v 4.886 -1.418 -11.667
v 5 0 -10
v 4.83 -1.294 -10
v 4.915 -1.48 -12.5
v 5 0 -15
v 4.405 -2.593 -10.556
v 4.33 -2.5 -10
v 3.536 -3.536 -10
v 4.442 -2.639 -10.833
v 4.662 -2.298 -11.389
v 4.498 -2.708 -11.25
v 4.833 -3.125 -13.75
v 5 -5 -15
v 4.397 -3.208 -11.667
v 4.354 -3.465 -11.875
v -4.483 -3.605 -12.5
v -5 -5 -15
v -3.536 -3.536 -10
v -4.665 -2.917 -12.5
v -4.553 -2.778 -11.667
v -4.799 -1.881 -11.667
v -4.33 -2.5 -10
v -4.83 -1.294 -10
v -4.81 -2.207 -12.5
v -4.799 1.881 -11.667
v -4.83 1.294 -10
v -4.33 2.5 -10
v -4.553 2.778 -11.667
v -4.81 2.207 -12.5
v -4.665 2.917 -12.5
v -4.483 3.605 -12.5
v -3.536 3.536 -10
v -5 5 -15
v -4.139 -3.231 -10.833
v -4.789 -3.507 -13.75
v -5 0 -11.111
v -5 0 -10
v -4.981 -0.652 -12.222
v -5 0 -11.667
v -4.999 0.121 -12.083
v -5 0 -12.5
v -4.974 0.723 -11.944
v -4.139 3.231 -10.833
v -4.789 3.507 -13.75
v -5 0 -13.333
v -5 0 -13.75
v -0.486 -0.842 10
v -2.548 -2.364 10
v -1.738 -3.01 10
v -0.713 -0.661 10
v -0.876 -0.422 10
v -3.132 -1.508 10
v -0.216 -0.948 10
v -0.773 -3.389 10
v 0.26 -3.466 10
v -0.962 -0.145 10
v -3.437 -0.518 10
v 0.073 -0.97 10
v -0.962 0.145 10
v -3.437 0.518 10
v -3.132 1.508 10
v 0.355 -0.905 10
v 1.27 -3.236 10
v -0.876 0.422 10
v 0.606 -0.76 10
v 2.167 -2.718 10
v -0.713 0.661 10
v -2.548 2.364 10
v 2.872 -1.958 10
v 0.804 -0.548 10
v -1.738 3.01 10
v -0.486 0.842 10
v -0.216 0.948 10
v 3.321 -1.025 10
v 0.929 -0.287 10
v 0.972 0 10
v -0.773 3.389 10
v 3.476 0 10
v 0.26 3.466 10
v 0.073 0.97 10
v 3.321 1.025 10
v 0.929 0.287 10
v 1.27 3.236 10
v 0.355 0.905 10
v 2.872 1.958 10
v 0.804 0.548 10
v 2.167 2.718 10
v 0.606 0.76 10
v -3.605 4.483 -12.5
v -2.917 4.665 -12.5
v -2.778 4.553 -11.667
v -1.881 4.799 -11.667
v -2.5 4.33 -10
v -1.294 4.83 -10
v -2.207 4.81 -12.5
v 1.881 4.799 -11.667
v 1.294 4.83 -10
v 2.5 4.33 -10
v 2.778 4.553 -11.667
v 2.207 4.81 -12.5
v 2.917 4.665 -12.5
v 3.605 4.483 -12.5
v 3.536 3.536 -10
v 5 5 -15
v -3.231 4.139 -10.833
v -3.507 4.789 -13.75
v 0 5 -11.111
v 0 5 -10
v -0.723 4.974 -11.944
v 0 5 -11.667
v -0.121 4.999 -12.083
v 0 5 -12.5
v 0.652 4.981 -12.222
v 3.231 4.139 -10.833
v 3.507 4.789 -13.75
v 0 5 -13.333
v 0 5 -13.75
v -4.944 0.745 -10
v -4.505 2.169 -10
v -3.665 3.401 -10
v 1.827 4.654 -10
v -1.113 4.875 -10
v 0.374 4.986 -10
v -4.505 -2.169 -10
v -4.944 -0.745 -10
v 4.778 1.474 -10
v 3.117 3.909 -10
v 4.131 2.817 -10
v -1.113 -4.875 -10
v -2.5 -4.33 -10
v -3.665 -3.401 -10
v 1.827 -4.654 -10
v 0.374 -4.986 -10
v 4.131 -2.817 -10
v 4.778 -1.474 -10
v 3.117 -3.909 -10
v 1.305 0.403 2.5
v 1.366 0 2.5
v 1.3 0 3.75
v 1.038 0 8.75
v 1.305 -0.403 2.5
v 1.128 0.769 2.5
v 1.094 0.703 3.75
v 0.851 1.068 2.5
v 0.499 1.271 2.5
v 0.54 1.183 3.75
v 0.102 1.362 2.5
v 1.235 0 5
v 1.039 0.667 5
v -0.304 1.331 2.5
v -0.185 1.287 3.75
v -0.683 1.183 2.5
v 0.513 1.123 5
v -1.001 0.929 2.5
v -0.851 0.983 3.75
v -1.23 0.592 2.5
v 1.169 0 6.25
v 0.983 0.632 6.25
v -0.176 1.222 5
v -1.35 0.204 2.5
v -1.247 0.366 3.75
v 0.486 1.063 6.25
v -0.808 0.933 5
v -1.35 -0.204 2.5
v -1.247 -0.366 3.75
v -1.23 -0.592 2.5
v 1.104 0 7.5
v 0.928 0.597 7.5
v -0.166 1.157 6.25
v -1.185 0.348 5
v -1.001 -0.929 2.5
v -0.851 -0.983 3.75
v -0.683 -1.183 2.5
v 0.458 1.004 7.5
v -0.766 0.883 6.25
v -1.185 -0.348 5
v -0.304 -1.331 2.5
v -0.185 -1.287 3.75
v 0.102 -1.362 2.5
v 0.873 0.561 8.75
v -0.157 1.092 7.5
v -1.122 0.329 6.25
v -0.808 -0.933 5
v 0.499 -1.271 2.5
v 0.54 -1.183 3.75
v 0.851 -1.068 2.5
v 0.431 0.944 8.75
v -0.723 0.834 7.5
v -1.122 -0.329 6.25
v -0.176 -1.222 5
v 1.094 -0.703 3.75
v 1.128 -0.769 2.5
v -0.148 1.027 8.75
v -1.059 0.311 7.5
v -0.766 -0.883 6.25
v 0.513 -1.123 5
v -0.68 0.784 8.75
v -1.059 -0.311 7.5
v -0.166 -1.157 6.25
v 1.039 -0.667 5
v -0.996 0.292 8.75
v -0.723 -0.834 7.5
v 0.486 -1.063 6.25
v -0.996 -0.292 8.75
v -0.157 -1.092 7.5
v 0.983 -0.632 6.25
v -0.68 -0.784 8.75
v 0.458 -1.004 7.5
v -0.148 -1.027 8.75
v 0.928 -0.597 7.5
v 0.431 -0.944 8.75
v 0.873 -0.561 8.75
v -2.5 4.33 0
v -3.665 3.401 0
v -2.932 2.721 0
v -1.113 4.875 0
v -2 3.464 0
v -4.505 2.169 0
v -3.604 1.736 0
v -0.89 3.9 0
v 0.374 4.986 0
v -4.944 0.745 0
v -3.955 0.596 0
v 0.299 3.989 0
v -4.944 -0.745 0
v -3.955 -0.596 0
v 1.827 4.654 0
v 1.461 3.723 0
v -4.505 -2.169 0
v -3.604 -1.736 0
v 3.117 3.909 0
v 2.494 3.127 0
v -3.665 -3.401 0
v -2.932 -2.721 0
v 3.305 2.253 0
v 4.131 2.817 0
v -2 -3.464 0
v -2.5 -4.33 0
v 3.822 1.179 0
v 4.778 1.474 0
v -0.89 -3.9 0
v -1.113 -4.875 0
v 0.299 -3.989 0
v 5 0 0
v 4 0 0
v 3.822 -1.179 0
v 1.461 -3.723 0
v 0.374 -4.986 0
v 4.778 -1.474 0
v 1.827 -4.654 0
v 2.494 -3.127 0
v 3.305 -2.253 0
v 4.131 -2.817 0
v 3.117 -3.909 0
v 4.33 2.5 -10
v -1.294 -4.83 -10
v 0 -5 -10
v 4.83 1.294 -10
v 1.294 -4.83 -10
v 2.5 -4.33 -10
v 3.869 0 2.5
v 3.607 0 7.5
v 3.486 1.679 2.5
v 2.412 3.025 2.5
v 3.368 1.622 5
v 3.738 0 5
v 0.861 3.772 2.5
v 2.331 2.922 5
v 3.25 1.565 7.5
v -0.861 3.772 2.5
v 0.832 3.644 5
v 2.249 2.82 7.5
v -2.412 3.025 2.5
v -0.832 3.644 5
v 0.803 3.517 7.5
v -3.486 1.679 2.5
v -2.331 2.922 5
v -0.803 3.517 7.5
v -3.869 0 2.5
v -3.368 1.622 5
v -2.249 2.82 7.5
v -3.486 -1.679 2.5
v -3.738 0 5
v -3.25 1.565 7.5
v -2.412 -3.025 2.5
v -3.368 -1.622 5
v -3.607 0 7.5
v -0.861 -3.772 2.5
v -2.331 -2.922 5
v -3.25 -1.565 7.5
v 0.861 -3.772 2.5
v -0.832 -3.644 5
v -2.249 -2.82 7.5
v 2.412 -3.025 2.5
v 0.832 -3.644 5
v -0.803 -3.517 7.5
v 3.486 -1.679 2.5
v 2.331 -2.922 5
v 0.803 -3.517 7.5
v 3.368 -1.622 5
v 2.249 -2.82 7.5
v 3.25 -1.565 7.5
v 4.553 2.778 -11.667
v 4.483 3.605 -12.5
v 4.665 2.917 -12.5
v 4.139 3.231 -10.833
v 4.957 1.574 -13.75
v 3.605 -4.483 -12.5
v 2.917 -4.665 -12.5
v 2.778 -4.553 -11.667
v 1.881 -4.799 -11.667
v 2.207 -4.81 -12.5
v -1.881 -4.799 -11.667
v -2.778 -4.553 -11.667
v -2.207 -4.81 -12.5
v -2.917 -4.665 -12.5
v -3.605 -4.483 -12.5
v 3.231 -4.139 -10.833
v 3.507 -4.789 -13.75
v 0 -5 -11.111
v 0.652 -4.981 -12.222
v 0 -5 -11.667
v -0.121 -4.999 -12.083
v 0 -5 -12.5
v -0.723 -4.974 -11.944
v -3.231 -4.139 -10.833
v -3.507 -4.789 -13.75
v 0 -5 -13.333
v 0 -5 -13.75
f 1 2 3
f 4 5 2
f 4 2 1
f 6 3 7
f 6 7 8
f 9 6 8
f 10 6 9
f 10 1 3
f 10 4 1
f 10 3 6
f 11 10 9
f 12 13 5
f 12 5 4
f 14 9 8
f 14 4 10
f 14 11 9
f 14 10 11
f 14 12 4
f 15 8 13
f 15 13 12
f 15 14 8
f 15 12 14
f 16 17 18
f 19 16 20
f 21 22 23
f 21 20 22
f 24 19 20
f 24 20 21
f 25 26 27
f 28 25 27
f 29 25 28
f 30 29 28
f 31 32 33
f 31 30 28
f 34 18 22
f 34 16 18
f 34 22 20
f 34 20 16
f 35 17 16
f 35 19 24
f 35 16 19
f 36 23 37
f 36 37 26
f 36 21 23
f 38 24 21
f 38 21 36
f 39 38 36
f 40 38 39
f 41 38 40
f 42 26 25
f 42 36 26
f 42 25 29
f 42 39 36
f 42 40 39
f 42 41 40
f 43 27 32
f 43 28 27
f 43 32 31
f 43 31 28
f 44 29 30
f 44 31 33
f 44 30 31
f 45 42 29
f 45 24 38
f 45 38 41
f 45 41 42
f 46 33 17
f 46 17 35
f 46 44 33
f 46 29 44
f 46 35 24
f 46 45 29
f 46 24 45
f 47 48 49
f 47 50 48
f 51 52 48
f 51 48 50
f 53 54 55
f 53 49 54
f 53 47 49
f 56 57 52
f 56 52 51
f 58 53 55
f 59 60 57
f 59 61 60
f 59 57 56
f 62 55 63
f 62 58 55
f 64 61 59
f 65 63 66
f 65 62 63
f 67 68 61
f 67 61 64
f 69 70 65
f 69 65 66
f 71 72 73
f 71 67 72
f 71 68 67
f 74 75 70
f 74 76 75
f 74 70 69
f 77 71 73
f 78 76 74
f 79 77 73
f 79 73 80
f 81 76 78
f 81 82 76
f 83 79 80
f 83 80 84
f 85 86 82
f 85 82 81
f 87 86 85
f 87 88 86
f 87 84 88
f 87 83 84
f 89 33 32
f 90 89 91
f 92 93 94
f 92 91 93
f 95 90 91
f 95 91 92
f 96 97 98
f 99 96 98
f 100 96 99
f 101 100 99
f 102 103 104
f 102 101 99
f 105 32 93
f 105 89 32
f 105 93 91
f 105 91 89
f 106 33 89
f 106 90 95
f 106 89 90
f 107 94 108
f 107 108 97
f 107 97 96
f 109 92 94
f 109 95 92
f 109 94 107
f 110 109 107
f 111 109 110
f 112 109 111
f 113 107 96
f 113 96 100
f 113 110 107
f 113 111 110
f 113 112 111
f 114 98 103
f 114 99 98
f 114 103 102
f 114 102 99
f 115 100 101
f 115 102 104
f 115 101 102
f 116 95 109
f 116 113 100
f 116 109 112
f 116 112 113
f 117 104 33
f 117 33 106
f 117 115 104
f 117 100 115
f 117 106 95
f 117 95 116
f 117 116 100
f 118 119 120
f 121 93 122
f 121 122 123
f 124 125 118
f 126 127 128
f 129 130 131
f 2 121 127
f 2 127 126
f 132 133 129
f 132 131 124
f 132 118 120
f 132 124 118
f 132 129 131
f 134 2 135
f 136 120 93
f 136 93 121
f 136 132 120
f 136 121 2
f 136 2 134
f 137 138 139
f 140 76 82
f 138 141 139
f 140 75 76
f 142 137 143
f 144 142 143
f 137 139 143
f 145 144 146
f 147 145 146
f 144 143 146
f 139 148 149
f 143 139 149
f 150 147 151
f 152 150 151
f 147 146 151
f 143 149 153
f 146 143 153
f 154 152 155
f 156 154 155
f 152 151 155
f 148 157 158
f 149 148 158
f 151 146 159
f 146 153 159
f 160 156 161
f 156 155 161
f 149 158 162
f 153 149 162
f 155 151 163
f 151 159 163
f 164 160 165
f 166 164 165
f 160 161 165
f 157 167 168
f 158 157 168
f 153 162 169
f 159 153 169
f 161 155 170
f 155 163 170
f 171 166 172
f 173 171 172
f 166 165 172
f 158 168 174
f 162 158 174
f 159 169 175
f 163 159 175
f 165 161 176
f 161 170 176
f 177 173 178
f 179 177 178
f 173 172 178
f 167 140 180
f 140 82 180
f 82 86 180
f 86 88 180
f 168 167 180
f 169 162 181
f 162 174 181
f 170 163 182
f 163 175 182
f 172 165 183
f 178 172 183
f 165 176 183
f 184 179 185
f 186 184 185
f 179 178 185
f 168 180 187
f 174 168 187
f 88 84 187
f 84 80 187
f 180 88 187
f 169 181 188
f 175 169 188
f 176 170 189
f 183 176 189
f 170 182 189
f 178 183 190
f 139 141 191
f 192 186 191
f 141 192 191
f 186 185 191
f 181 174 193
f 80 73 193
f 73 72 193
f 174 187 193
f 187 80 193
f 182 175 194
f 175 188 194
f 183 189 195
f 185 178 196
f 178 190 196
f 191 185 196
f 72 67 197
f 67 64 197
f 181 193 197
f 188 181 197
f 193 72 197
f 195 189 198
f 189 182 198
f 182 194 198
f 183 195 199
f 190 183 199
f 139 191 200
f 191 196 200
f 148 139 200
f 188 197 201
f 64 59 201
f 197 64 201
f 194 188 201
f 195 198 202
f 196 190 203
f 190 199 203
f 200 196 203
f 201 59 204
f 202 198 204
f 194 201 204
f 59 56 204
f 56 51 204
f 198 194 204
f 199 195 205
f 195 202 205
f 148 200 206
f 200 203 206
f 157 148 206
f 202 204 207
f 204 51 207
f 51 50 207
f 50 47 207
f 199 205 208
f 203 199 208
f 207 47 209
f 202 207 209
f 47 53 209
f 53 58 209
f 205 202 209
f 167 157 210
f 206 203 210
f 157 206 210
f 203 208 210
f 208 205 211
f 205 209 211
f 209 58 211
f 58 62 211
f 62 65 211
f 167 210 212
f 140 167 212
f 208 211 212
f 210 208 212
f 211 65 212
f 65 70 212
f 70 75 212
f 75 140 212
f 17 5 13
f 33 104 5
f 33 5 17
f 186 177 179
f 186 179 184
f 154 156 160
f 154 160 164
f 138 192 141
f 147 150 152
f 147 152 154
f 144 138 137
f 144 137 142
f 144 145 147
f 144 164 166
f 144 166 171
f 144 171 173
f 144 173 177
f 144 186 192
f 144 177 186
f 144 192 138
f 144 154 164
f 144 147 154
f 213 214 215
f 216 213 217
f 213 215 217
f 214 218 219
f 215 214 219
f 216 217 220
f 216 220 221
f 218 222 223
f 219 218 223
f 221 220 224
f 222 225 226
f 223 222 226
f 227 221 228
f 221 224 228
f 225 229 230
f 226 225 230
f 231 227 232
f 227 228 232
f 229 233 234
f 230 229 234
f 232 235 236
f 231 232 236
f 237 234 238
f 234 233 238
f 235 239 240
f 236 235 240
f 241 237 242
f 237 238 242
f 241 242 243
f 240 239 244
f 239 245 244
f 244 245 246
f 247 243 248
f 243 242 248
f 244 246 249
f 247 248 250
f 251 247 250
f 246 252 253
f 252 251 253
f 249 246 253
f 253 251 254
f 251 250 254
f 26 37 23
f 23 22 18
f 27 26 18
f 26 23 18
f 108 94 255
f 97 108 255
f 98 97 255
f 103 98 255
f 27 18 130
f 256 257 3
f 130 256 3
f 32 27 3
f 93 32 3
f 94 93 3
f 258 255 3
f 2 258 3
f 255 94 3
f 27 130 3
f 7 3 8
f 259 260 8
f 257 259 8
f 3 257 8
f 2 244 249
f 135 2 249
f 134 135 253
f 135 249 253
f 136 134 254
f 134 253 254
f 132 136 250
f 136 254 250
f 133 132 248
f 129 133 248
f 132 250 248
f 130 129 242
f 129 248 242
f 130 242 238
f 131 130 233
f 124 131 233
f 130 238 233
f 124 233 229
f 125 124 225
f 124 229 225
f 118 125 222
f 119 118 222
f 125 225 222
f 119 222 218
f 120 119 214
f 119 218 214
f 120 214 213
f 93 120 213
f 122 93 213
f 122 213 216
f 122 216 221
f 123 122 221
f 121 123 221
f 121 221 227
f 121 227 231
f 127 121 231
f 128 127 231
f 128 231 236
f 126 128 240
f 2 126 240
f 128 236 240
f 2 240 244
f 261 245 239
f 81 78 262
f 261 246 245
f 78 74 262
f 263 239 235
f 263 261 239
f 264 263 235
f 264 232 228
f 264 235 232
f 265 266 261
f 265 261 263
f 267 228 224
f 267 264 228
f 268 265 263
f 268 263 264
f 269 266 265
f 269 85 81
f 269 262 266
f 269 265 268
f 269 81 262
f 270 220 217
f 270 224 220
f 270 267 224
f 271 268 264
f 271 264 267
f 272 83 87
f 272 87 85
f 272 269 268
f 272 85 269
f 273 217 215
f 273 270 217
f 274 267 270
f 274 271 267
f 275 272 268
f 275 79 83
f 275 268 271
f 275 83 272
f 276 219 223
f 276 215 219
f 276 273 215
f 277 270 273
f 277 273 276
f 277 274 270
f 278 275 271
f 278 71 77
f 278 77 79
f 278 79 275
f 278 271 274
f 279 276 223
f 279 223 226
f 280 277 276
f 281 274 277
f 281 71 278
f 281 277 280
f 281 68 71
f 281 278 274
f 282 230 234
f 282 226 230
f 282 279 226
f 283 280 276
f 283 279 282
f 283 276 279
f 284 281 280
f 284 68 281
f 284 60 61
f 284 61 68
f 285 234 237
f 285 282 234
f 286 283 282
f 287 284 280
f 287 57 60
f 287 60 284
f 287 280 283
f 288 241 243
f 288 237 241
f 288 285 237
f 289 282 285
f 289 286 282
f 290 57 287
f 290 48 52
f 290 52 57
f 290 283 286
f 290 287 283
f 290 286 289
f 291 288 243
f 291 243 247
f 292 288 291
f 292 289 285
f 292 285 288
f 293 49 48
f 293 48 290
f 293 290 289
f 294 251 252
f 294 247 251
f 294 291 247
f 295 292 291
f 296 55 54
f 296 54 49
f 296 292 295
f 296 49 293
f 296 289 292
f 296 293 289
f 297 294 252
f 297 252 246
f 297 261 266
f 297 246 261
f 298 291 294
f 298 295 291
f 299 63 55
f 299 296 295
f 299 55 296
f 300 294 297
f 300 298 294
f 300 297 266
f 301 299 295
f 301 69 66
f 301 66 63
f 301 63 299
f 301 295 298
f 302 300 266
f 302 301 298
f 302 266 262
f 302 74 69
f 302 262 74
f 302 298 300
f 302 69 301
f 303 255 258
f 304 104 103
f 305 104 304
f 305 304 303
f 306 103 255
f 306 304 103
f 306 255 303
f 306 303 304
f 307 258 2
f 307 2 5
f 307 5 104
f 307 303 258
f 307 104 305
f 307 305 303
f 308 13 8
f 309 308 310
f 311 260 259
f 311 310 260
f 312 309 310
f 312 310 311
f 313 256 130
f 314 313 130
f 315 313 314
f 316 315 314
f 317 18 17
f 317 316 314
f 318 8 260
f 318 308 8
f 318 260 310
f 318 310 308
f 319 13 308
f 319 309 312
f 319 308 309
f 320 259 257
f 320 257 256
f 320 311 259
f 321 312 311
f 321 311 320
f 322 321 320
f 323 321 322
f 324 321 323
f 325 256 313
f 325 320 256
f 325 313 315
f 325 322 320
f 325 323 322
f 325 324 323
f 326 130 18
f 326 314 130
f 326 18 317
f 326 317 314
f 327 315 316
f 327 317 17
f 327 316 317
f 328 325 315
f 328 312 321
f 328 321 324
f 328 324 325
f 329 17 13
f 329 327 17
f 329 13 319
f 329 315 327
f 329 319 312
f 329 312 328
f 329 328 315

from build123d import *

# Parameters (mm, degrees)
F0_R      = 4
F1_DEPTH  = 10
F1_TAPER  = 3
F2_T      = -2.5
F3_R      = 5
F4_DEPTH  = 10
F4_FACE_R = 5
F6_W      = 10
F6_H      = 10


with BuildPart() as f1:
    # F0 (on Top) → F1 (new body)
    with BuildSketch(Plane.XY):
        Circle(F0_R)
    extrude(amount=F1_DEPTH, taper=F1_TAPER)

    # F2
    f2_openings = [f1.faces().sort_by_distance(p)[0] for p in [
        (0, 0, 10),
    ]]
    offset(amount=F2_T, openings=f2_openings)

    # F3 (on face) → F4 (join)
    with BuildSketch(Plane(origin=(0, 0, 0), x_dir=(1, 0, 0), z_dir=(0, 0, -1))):
        Circle(F3_R)
    extrude(amount=F4_DEPTH)


with BuildPart() as f7:
    # F4_face (on face) → F7 section 0
    with BuildSketch(Plane(origin=(0, 0, -10), x_dir=(1, 0, 0), z_dir=(0, 0, -1))):
        Circle(F4_FACE_R)
    # F6 (on offset) → F7 section 1
    with BuildSketch(Plane(origin=(0, 0, -15), x_dir=(1, 0, 0), z_dir=(0, 0, -1))):
        Rectangle(F6_W, F6_H)
    loft()


solid = Compound([f1.part, f7.part])
